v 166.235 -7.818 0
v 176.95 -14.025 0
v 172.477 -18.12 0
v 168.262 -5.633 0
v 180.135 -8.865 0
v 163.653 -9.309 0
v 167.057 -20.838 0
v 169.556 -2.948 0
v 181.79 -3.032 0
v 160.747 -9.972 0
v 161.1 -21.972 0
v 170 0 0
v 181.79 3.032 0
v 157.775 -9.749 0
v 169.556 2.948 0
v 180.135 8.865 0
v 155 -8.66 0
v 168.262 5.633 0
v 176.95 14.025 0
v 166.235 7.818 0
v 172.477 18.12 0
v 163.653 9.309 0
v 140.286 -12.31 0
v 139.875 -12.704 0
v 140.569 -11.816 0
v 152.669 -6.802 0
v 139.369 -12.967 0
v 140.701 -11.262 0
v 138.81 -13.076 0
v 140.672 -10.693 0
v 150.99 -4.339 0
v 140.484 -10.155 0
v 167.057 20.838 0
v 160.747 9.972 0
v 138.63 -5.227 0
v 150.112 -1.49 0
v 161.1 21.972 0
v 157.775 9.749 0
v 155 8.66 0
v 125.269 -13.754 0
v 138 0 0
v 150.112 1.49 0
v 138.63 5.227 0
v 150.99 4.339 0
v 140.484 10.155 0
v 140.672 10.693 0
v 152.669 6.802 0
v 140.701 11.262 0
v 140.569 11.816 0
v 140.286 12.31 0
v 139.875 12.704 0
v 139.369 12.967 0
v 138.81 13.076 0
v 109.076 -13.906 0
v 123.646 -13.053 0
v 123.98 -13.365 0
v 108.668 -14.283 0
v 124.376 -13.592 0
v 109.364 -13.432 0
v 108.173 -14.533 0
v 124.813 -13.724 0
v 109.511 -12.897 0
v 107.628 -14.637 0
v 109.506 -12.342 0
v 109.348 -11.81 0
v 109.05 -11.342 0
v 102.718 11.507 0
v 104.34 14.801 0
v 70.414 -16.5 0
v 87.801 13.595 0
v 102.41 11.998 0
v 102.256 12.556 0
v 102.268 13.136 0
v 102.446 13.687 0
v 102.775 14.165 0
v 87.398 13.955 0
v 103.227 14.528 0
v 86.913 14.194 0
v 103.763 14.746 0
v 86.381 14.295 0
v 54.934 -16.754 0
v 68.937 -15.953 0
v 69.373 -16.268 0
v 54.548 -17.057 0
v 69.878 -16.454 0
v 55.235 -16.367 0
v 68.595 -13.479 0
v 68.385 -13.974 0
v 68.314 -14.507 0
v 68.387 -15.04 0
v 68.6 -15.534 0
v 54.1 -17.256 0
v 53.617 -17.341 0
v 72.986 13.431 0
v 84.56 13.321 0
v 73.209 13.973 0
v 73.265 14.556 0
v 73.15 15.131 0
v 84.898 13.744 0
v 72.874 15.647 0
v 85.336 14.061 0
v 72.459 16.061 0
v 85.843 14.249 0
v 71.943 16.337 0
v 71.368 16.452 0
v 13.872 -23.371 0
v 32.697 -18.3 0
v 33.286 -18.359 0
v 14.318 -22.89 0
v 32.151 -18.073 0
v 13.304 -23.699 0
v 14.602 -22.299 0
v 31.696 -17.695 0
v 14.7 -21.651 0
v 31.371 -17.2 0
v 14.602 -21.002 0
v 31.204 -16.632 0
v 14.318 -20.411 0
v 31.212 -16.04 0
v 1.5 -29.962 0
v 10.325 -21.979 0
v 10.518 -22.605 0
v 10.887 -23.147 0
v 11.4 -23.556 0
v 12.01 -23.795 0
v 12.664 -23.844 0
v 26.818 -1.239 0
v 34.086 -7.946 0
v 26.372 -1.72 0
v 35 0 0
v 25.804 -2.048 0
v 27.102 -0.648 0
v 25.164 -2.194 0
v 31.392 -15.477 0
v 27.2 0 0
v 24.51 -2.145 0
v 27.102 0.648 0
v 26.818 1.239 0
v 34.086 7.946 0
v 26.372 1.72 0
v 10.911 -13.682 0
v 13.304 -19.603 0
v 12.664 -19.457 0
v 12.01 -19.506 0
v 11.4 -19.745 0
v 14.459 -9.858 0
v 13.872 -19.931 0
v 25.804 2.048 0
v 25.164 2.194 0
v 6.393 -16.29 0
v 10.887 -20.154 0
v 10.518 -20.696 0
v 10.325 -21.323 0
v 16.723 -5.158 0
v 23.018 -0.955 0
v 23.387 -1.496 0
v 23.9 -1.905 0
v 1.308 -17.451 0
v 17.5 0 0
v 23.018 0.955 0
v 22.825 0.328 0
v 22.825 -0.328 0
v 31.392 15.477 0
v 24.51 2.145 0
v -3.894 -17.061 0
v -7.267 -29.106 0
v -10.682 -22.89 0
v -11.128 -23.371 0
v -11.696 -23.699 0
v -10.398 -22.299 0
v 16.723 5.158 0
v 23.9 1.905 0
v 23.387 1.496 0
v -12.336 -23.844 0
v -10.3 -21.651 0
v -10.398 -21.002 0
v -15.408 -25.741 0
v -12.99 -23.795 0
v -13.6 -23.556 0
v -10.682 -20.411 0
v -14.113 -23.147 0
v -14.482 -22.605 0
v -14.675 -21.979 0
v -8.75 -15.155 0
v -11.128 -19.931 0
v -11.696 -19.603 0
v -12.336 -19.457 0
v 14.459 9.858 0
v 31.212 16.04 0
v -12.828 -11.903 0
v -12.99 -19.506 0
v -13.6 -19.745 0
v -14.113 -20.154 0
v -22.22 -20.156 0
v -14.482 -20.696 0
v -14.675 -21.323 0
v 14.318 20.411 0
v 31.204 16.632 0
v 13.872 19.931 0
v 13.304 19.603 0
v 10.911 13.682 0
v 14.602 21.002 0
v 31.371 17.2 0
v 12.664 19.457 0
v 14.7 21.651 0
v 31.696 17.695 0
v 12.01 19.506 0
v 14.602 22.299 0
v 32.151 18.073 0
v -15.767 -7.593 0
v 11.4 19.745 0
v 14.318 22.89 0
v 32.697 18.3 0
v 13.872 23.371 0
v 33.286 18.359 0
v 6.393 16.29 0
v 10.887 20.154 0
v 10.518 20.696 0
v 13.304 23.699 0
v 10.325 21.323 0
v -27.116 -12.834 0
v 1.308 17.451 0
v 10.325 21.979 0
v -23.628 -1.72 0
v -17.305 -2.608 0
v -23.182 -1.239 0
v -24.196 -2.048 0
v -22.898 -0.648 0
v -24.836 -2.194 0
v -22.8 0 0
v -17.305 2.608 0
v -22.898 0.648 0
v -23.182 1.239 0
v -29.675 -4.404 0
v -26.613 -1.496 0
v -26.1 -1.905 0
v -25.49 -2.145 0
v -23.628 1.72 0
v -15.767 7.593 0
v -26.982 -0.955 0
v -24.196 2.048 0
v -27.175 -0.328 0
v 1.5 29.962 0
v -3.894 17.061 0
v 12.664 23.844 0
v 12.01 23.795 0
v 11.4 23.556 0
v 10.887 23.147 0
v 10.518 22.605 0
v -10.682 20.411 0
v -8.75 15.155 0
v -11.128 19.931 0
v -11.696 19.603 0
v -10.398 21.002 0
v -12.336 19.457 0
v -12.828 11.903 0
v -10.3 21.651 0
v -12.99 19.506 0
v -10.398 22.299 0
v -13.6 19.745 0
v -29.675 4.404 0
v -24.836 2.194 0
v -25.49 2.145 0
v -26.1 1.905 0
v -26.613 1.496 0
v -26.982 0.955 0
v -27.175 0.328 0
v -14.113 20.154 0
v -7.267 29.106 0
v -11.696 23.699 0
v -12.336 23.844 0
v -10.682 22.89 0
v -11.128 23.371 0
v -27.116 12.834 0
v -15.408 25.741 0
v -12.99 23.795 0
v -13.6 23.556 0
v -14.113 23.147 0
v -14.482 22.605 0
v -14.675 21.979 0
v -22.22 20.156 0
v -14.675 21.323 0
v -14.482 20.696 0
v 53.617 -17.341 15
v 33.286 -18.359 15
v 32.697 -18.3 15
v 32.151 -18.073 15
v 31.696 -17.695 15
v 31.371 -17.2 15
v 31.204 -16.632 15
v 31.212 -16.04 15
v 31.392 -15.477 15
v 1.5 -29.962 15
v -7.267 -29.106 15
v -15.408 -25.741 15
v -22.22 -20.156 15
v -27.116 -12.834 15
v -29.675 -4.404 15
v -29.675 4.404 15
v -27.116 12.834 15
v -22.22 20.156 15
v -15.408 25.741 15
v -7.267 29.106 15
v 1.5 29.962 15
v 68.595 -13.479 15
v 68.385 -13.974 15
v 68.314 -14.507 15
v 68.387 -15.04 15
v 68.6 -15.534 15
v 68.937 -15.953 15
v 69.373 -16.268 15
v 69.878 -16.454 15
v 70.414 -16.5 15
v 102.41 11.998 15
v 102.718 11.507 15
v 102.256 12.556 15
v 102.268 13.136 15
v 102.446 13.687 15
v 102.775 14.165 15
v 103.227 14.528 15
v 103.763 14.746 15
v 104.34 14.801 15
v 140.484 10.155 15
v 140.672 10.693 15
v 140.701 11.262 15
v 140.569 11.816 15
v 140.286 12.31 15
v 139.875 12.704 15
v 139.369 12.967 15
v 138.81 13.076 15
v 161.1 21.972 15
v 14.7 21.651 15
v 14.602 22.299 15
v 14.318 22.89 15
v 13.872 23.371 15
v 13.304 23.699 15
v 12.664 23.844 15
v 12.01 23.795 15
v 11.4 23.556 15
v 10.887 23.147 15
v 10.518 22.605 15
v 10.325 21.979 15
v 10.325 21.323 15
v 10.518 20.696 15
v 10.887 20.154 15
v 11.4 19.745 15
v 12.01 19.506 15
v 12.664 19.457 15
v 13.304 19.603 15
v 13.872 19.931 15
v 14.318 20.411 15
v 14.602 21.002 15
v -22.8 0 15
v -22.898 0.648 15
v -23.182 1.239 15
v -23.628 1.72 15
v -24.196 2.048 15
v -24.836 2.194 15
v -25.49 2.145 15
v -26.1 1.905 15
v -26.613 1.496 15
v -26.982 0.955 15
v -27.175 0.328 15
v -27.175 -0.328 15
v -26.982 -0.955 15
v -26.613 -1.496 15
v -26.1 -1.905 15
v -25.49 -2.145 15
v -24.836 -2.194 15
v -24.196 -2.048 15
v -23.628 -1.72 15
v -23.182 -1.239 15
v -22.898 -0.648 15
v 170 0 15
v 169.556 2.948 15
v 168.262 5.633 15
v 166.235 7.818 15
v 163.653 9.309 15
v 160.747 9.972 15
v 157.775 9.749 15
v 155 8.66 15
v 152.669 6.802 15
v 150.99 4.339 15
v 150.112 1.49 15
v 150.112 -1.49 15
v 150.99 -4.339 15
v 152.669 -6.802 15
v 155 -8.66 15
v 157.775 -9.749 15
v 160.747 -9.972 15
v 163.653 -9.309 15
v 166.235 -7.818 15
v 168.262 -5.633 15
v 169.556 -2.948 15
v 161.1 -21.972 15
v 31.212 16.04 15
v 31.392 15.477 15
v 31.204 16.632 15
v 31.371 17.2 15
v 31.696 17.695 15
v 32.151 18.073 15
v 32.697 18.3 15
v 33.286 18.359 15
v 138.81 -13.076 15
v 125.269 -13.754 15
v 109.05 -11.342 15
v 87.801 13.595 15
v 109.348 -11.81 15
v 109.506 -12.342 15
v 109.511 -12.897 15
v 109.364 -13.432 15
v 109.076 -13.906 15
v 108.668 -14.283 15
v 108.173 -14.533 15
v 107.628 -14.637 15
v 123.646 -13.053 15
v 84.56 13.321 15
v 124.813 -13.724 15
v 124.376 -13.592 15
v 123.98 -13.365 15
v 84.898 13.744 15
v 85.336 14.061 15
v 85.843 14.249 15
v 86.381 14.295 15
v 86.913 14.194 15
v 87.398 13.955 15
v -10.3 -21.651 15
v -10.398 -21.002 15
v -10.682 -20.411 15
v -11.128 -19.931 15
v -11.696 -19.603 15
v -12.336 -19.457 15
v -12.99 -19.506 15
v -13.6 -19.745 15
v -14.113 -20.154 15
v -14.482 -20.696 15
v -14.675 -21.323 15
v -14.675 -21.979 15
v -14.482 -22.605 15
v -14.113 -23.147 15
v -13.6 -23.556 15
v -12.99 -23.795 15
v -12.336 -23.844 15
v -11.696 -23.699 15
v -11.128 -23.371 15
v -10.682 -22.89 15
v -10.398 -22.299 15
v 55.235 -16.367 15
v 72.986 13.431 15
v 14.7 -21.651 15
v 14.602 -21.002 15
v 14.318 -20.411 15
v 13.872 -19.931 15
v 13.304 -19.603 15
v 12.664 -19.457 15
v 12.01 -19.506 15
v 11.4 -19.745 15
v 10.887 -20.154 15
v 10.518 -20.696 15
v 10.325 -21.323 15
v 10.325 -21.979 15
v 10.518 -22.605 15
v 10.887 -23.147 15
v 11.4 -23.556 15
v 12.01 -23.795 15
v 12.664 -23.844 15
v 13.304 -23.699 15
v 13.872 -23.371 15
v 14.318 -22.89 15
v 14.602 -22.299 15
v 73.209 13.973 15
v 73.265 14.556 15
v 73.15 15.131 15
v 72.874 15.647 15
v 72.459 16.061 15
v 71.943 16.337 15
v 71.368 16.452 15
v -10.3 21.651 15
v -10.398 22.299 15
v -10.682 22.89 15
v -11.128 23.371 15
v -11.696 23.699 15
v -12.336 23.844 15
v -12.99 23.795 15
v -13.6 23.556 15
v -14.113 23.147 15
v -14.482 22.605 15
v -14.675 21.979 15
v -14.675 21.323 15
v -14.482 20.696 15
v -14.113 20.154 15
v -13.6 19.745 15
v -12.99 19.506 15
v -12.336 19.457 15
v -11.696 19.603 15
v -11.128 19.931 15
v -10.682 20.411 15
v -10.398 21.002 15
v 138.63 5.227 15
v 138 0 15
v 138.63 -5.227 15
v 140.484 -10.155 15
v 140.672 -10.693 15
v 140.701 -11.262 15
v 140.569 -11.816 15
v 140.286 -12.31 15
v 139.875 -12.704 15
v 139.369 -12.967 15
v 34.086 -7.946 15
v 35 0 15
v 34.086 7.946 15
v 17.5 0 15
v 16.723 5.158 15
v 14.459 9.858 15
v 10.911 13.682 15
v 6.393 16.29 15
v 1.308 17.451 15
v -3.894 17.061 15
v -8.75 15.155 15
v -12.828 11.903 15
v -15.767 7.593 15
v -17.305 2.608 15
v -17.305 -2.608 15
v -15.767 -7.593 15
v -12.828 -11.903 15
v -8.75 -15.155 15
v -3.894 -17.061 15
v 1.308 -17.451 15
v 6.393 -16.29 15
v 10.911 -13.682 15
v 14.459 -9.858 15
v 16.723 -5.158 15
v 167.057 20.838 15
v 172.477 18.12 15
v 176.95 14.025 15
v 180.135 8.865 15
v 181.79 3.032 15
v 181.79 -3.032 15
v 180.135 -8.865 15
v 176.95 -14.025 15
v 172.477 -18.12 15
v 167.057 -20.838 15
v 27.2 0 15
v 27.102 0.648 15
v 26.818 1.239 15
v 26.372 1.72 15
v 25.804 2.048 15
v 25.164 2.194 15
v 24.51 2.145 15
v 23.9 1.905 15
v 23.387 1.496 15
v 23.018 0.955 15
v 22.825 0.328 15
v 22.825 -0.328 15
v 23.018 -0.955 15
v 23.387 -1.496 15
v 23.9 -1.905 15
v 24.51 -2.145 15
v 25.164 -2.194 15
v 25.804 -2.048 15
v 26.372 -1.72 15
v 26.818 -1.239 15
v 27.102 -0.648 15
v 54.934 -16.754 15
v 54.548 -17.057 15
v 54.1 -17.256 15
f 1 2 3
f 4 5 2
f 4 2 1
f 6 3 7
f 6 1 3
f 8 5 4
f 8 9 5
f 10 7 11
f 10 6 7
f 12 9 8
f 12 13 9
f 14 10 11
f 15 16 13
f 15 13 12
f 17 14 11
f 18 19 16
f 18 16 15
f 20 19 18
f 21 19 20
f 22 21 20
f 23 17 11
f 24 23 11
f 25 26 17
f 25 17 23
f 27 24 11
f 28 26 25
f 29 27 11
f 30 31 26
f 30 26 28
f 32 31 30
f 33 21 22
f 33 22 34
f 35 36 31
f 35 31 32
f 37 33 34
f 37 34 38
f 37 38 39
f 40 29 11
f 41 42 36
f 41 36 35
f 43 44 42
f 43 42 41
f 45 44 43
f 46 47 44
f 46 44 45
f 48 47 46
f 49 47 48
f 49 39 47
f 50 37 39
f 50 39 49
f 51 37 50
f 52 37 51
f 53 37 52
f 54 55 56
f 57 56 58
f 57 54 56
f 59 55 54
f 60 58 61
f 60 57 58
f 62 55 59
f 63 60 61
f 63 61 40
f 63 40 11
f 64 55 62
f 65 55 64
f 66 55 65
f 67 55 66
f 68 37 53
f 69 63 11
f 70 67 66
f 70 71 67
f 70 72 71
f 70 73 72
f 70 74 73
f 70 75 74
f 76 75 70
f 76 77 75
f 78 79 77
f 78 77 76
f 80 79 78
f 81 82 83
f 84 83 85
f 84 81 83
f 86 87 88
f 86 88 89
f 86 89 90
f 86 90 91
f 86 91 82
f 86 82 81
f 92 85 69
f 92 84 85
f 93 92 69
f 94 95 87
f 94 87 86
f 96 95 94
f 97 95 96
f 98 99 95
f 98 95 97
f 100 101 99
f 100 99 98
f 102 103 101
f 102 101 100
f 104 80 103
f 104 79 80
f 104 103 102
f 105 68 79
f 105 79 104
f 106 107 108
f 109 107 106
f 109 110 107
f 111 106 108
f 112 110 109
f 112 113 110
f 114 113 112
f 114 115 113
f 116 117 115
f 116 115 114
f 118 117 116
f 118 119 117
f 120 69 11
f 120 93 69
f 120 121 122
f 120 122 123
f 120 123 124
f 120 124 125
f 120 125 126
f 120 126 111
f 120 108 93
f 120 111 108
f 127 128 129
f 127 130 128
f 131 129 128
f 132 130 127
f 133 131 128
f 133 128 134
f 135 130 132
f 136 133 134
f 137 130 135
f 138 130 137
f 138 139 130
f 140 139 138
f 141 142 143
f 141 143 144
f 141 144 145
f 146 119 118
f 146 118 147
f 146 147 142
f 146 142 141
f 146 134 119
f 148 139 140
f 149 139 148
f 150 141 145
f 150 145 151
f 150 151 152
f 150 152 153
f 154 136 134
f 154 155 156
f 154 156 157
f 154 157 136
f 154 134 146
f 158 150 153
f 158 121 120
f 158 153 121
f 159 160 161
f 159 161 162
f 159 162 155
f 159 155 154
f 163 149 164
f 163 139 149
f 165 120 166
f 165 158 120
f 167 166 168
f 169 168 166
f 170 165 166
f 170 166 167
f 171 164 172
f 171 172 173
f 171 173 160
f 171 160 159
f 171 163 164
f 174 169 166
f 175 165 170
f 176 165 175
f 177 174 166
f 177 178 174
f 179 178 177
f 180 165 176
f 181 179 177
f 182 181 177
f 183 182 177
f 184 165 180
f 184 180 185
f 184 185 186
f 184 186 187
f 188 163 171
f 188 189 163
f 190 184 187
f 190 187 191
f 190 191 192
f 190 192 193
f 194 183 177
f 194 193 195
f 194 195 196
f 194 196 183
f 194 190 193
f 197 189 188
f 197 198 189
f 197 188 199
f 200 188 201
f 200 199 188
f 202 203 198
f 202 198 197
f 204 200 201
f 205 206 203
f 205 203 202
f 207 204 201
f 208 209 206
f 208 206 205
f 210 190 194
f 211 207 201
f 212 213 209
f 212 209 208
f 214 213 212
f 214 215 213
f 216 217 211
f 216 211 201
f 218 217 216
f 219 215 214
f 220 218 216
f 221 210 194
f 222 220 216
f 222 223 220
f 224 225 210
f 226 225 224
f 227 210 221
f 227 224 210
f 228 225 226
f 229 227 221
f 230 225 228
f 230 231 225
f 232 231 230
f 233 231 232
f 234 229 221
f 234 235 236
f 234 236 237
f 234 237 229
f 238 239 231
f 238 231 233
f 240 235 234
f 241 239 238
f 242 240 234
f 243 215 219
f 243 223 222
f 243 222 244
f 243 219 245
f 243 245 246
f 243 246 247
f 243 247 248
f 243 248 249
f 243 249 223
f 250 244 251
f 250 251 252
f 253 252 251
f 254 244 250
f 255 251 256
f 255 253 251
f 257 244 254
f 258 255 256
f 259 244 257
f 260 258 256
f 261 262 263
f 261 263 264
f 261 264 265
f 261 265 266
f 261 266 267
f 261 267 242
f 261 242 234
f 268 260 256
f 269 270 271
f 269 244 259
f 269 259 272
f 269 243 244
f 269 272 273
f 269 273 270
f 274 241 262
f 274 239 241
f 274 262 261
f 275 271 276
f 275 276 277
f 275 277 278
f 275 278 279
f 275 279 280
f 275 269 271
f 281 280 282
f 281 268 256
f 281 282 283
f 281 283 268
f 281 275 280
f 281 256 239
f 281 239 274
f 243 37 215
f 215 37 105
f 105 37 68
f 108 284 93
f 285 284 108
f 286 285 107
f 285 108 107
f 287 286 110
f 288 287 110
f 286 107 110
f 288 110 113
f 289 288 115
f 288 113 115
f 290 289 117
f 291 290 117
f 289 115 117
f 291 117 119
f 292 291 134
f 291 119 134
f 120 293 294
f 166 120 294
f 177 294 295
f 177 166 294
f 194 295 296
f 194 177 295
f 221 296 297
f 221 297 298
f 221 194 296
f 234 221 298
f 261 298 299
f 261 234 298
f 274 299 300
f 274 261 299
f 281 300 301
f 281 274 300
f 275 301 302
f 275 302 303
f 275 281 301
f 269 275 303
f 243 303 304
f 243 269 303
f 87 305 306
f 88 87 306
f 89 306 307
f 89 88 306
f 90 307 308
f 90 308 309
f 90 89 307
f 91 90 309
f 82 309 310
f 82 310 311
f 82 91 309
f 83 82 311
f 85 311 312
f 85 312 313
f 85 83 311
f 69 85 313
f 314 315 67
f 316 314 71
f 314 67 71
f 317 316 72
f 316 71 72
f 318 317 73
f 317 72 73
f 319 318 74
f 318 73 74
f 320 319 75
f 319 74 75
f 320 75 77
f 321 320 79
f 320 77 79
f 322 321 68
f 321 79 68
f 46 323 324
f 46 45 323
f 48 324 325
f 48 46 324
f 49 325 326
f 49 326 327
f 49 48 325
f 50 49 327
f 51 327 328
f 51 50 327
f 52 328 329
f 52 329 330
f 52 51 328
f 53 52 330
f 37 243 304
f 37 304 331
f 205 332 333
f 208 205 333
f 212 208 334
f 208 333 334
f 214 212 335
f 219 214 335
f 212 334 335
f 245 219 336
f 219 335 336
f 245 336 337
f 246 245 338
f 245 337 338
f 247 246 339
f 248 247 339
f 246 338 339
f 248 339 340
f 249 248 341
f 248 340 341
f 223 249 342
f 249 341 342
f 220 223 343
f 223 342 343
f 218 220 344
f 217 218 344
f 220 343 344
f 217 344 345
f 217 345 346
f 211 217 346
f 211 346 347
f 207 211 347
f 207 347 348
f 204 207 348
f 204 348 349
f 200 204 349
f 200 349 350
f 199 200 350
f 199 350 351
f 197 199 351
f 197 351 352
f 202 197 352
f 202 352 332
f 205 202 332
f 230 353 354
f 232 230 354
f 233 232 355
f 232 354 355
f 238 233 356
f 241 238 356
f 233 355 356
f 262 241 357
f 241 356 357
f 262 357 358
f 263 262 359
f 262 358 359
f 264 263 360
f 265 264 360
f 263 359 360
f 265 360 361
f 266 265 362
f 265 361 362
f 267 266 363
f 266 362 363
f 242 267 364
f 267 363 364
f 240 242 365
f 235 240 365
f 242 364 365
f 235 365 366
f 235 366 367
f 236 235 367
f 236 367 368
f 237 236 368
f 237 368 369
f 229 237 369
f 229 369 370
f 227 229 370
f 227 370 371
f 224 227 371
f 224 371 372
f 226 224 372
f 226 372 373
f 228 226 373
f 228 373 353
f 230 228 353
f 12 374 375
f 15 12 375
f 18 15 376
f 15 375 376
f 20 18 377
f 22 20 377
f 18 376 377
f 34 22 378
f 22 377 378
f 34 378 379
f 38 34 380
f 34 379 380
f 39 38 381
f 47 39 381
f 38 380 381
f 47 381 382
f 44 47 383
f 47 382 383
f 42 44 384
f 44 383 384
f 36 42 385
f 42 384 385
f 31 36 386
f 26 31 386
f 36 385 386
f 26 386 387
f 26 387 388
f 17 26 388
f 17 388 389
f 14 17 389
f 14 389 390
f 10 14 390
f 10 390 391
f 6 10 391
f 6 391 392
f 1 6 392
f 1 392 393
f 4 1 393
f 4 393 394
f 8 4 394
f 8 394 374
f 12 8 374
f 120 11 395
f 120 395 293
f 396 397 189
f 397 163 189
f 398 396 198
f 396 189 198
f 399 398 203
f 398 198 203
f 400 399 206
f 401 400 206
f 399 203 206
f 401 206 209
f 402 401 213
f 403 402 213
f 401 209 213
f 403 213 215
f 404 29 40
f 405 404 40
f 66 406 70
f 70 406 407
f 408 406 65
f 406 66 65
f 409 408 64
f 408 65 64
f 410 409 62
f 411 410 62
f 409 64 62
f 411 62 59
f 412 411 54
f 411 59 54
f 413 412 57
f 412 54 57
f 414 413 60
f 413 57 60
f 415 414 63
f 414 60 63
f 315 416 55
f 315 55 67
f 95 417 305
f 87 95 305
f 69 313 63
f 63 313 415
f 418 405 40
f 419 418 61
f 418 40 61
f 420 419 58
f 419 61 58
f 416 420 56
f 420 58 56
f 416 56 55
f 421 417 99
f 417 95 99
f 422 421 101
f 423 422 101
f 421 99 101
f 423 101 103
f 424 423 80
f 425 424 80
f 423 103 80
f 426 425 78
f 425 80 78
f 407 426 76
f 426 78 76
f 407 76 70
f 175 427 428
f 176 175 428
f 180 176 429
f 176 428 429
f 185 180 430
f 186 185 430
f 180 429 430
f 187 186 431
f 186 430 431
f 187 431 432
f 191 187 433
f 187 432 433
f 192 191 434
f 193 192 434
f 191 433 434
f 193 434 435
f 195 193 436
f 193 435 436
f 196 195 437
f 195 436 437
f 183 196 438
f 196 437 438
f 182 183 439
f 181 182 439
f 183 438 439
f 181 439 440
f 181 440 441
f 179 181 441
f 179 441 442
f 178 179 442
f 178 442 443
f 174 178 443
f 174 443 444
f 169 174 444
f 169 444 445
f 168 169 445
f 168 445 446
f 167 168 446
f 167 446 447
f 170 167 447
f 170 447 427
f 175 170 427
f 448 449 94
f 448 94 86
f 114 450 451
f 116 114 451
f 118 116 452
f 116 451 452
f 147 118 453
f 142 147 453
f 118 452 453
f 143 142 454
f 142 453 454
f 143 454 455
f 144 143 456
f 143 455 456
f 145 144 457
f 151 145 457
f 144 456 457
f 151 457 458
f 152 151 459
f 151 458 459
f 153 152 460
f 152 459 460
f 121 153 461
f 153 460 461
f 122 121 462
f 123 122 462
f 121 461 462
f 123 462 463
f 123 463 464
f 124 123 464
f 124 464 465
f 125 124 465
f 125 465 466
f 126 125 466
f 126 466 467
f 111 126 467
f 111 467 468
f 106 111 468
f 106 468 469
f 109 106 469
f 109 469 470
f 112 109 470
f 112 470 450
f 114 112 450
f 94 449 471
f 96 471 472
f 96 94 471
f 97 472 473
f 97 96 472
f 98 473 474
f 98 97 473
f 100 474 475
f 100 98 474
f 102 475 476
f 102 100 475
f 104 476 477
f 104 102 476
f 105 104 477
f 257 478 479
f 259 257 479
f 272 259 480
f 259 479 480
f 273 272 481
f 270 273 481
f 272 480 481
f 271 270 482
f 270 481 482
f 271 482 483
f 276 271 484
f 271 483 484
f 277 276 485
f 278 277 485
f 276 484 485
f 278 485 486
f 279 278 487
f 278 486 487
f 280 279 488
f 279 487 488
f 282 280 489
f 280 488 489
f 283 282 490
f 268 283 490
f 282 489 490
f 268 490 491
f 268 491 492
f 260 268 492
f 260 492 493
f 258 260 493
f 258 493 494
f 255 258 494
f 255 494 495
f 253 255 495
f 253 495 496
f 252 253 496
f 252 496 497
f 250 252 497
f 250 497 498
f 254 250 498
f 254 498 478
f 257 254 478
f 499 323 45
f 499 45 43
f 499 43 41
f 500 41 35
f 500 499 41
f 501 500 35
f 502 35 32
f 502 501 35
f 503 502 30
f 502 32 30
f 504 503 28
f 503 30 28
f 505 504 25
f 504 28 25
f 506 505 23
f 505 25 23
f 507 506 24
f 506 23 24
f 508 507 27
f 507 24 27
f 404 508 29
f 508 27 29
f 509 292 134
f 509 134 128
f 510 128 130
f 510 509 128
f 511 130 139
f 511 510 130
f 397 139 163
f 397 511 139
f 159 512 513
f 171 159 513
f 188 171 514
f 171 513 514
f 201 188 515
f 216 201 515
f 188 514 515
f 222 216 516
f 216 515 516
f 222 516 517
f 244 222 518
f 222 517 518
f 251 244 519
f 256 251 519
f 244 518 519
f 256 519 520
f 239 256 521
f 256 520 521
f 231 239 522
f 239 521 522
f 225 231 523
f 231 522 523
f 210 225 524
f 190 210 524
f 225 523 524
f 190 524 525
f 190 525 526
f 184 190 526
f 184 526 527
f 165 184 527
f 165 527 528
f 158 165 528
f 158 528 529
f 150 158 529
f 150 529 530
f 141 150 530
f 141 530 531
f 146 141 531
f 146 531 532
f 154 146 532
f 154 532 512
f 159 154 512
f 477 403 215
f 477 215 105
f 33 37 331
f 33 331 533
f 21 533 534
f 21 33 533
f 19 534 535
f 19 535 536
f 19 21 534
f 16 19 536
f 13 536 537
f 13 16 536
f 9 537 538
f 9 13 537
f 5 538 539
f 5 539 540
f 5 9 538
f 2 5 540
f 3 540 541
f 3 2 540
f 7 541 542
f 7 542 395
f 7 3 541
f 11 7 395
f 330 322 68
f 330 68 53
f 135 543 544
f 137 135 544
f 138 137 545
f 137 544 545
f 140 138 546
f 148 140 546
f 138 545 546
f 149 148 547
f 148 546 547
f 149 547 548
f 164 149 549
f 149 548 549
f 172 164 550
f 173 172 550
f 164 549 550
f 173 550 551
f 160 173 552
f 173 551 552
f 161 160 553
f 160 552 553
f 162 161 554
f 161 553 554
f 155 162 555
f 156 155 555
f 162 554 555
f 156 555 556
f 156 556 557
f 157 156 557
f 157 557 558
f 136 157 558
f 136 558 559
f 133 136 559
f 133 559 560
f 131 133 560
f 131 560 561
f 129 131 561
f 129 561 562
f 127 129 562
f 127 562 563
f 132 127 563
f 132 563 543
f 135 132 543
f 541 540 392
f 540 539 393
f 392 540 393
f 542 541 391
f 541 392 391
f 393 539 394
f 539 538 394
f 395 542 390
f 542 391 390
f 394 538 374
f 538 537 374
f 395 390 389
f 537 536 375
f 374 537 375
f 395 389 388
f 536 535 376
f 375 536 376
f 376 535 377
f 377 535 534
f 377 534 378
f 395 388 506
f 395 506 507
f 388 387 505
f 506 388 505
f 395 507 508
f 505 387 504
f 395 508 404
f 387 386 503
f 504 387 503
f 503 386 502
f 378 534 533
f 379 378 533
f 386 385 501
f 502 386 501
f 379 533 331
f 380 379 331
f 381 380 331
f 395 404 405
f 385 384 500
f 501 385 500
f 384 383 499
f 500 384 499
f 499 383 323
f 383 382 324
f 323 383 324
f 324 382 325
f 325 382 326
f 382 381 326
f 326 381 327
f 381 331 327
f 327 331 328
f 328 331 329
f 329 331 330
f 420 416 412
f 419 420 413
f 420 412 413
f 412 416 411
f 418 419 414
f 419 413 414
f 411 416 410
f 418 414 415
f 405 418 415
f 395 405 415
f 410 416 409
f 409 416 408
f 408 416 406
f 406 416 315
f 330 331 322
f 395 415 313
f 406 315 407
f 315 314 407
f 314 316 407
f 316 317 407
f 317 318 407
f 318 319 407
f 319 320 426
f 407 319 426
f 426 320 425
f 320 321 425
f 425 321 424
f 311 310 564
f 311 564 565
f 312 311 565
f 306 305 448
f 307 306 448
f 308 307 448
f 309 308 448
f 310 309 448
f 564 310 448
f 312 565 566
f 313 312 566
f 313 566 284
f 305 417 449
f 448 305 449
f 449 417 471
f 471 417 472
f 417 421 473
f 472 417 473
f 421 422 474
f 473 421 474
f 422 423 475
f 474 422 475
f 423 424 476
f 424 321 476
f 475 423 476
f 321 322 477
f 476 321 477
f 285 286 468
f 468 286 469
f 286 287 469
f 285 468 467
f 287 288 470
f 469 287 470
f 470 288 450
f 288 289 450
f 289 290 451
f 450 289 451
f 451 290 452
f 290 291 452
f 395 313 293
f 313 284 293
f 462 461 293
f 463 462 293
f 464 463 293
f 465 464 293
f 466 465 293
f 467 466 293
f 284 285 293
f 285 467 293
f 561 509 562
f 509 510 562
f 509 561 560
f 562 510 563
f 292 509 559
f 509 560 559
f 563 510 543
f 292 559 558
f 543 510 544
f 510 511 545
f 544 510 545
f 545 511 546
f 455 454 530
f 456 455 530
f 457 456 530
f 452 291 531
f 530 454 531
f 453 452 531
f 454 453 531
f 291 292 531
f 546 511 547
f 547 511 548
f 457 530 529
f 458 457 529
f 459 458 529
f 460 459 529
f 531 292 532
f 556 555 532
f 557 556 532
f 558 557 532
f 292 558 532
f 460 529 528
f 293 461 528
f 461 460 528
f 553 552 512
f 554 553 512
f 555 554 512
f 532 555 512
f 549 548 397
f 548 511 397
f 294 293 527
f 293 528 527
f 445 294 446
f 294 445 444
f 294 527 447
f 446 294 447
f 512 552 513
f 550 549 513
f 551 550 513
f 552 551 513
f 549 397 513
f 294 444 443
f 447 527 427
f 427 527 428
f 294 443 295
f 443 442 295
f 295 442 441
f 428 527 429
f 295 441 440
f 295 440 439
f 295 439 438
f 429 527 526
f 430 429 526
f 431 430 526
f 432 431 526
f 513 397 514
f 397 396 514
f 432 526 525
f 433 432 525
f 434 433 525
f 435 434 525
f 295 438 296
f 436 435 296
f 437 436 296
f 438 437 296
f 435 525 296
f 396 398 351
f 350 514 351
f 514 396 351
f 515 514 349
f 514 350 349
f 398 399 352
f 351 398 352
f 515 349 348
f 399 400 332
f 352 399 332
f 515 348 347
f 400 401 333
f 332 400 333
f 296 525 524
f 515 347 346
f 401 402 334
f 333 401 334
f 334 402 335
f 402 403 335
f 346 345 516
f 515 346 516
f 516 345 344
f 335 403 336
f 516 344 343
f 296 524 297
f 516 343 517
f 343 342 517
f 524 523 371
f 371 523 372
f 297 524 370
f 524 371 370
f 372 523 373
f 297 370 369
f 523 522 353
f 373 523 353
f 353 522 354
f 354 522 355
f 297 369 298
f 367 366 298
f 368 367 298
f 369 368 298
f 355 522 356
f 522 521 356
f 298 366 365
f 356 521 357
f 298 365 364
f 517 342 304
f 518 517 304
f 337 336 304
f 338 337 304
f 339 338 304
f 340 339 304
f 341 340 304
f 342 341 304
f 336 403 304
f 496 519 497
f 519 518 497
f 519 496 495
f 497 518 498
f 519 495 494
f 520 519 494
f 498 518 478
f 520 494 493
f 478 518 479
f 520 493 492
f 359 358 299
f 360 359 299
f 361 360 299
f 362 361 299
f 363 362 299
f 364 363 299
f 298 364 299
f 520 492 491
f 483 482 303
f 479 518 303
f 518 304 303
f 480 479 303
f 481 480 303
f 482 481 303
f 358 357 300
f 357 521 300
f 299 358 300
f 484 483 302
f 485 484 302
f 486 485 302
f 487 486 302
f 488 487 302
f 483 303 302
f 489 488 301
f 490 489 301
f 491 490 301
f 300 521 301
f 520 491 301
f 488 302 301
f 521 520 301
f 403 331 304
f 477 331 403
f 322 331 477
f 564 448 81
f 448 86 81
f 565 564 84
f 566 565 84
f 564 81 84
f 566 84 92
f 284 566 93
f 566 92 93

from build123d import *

# Parameters (mm, degrees)
EXTRUDE_1_DEPTH     = 15
SKETCH_2_R          = 2.2
SKETCH_2_R_2        = 10
CUT_EXTRUDE_1_DEPTH = 186.064853497
SKETCH_3_R          = 17.5
CUT_EXTRUDE_2_DEPTH = 186.064853497
FILLET_1_R          = 2


with BuildPart() as part:
    # 草图1 → 凸台-拉伸1 (new body)
    with BuildSketch(Plane.XY):
        with BuildLine():
            Line((1.5, 29.962476533), (161.1, 21.972482791))
            ThreePointArc((161.1, 21.972482791), (182, 0), (161.1, -21.972482791))
            Line((161.1, -21.972482791), (1.5, -29.962476533))
            ThreePointArc((1.5, -29.962476533), (-30, 0), (1.5, 29.962476533))
        make_face()
    extrude(amount=EXTRUDE_1_DEPTH)

    # 草图2 → 切除-拉伸1 (cut, through all)
    with BuildSketch(Plane.XY.offset(15)):
        with Locations((-25, 0)):
            Circle(SKETCH_2_R)
        with Locations((-12.5, 21.650635095)):
            Circle(SKETCH_2_R)
        with Locations((12.5, 21.650635095)):
            Circle(SKETCH_2_R)
        with Locations((25, 0)):
            Circle(SKETCH_2_R)
        with Locations((12.5, -21.650635095)):
            Circle(SKETCH_2_R)
        with Locations((-12.5, -21.650635095)):
            Circle(SKETCH_2_R)
        with Locations((160, 0)):
            Circle(SKETCH_2_R_2)
    extrude(amount=-CUT_EXTRUDE_1_DEPTH, mode=Mode.SUBTRACT)

    # 草图3 → 切除-拉伸2 (cut, through all)
    with BuildSketch(Plane.XY.offset(15)):
        Circle(SKETCH_3_R)
        with BuildLine():
            Line((29.686887248, 18.538843694), (74.686887248, 16.286025909))
            Line((74.686887248, 16.286025909), (54.686887248, -17.287278258))
            Line((54.686887248, -17.287278258), (29.686887248, -18.538843694))
            ThreePointArc((29.686887248, -18.538843694), (35, 0), (29.686887248, 18.538843694))
        make_face()
        Polygon((85.989702062, 15.720177415), (66.684590425, -16.686641834), (111.684590425, -14.433824049), align=None)
        with BuildLine():
            Line((99.713301235, 15.03313812), (142.18397437, 12.906945059))
            ThreePointArc((142.18397437, 12.906945059), (138, 0), (142.18397437, -12.906945059))
            Line((142.18397437, -12.906945059), (124.285212578, -13.803003923))
            Line((124.285212578, -13.803003923), (99.713301235, 15.03313812))
        make_face()
    extrude(amount=-CUT_EXTRUDE_2_DEPTH, mode=Mode.SUBTRACT)

    # 圆角1
    fillet_1_edges = [part.edges().sort_by_distance(p)[0] for p in [
        (124.285212578, -13.803003923, 7.5),
        (99.713301235, 15.03313812, 7.5),
        (142.18397437, 12.906945059, 7.5),
        (142.18397437, -12.906945059, 7.5),
        (85.989702062, 15.720177415, 7.5),
        (111.684590425, -14.433824049, 7.5),
        (66.684590425, -16.686641834, 7.5),
        (74.686887248, 16.286025909, 7.5),
        (54.686887248, -17.287278258, 7.5),
        (29.686887248, -18.538843694, 7.5),
        (29.686887248, 18.538843694, 7.5),
    ]]
    fillet(fillet_1_edges, radius=FILLET_1_R)


solid = part.part
